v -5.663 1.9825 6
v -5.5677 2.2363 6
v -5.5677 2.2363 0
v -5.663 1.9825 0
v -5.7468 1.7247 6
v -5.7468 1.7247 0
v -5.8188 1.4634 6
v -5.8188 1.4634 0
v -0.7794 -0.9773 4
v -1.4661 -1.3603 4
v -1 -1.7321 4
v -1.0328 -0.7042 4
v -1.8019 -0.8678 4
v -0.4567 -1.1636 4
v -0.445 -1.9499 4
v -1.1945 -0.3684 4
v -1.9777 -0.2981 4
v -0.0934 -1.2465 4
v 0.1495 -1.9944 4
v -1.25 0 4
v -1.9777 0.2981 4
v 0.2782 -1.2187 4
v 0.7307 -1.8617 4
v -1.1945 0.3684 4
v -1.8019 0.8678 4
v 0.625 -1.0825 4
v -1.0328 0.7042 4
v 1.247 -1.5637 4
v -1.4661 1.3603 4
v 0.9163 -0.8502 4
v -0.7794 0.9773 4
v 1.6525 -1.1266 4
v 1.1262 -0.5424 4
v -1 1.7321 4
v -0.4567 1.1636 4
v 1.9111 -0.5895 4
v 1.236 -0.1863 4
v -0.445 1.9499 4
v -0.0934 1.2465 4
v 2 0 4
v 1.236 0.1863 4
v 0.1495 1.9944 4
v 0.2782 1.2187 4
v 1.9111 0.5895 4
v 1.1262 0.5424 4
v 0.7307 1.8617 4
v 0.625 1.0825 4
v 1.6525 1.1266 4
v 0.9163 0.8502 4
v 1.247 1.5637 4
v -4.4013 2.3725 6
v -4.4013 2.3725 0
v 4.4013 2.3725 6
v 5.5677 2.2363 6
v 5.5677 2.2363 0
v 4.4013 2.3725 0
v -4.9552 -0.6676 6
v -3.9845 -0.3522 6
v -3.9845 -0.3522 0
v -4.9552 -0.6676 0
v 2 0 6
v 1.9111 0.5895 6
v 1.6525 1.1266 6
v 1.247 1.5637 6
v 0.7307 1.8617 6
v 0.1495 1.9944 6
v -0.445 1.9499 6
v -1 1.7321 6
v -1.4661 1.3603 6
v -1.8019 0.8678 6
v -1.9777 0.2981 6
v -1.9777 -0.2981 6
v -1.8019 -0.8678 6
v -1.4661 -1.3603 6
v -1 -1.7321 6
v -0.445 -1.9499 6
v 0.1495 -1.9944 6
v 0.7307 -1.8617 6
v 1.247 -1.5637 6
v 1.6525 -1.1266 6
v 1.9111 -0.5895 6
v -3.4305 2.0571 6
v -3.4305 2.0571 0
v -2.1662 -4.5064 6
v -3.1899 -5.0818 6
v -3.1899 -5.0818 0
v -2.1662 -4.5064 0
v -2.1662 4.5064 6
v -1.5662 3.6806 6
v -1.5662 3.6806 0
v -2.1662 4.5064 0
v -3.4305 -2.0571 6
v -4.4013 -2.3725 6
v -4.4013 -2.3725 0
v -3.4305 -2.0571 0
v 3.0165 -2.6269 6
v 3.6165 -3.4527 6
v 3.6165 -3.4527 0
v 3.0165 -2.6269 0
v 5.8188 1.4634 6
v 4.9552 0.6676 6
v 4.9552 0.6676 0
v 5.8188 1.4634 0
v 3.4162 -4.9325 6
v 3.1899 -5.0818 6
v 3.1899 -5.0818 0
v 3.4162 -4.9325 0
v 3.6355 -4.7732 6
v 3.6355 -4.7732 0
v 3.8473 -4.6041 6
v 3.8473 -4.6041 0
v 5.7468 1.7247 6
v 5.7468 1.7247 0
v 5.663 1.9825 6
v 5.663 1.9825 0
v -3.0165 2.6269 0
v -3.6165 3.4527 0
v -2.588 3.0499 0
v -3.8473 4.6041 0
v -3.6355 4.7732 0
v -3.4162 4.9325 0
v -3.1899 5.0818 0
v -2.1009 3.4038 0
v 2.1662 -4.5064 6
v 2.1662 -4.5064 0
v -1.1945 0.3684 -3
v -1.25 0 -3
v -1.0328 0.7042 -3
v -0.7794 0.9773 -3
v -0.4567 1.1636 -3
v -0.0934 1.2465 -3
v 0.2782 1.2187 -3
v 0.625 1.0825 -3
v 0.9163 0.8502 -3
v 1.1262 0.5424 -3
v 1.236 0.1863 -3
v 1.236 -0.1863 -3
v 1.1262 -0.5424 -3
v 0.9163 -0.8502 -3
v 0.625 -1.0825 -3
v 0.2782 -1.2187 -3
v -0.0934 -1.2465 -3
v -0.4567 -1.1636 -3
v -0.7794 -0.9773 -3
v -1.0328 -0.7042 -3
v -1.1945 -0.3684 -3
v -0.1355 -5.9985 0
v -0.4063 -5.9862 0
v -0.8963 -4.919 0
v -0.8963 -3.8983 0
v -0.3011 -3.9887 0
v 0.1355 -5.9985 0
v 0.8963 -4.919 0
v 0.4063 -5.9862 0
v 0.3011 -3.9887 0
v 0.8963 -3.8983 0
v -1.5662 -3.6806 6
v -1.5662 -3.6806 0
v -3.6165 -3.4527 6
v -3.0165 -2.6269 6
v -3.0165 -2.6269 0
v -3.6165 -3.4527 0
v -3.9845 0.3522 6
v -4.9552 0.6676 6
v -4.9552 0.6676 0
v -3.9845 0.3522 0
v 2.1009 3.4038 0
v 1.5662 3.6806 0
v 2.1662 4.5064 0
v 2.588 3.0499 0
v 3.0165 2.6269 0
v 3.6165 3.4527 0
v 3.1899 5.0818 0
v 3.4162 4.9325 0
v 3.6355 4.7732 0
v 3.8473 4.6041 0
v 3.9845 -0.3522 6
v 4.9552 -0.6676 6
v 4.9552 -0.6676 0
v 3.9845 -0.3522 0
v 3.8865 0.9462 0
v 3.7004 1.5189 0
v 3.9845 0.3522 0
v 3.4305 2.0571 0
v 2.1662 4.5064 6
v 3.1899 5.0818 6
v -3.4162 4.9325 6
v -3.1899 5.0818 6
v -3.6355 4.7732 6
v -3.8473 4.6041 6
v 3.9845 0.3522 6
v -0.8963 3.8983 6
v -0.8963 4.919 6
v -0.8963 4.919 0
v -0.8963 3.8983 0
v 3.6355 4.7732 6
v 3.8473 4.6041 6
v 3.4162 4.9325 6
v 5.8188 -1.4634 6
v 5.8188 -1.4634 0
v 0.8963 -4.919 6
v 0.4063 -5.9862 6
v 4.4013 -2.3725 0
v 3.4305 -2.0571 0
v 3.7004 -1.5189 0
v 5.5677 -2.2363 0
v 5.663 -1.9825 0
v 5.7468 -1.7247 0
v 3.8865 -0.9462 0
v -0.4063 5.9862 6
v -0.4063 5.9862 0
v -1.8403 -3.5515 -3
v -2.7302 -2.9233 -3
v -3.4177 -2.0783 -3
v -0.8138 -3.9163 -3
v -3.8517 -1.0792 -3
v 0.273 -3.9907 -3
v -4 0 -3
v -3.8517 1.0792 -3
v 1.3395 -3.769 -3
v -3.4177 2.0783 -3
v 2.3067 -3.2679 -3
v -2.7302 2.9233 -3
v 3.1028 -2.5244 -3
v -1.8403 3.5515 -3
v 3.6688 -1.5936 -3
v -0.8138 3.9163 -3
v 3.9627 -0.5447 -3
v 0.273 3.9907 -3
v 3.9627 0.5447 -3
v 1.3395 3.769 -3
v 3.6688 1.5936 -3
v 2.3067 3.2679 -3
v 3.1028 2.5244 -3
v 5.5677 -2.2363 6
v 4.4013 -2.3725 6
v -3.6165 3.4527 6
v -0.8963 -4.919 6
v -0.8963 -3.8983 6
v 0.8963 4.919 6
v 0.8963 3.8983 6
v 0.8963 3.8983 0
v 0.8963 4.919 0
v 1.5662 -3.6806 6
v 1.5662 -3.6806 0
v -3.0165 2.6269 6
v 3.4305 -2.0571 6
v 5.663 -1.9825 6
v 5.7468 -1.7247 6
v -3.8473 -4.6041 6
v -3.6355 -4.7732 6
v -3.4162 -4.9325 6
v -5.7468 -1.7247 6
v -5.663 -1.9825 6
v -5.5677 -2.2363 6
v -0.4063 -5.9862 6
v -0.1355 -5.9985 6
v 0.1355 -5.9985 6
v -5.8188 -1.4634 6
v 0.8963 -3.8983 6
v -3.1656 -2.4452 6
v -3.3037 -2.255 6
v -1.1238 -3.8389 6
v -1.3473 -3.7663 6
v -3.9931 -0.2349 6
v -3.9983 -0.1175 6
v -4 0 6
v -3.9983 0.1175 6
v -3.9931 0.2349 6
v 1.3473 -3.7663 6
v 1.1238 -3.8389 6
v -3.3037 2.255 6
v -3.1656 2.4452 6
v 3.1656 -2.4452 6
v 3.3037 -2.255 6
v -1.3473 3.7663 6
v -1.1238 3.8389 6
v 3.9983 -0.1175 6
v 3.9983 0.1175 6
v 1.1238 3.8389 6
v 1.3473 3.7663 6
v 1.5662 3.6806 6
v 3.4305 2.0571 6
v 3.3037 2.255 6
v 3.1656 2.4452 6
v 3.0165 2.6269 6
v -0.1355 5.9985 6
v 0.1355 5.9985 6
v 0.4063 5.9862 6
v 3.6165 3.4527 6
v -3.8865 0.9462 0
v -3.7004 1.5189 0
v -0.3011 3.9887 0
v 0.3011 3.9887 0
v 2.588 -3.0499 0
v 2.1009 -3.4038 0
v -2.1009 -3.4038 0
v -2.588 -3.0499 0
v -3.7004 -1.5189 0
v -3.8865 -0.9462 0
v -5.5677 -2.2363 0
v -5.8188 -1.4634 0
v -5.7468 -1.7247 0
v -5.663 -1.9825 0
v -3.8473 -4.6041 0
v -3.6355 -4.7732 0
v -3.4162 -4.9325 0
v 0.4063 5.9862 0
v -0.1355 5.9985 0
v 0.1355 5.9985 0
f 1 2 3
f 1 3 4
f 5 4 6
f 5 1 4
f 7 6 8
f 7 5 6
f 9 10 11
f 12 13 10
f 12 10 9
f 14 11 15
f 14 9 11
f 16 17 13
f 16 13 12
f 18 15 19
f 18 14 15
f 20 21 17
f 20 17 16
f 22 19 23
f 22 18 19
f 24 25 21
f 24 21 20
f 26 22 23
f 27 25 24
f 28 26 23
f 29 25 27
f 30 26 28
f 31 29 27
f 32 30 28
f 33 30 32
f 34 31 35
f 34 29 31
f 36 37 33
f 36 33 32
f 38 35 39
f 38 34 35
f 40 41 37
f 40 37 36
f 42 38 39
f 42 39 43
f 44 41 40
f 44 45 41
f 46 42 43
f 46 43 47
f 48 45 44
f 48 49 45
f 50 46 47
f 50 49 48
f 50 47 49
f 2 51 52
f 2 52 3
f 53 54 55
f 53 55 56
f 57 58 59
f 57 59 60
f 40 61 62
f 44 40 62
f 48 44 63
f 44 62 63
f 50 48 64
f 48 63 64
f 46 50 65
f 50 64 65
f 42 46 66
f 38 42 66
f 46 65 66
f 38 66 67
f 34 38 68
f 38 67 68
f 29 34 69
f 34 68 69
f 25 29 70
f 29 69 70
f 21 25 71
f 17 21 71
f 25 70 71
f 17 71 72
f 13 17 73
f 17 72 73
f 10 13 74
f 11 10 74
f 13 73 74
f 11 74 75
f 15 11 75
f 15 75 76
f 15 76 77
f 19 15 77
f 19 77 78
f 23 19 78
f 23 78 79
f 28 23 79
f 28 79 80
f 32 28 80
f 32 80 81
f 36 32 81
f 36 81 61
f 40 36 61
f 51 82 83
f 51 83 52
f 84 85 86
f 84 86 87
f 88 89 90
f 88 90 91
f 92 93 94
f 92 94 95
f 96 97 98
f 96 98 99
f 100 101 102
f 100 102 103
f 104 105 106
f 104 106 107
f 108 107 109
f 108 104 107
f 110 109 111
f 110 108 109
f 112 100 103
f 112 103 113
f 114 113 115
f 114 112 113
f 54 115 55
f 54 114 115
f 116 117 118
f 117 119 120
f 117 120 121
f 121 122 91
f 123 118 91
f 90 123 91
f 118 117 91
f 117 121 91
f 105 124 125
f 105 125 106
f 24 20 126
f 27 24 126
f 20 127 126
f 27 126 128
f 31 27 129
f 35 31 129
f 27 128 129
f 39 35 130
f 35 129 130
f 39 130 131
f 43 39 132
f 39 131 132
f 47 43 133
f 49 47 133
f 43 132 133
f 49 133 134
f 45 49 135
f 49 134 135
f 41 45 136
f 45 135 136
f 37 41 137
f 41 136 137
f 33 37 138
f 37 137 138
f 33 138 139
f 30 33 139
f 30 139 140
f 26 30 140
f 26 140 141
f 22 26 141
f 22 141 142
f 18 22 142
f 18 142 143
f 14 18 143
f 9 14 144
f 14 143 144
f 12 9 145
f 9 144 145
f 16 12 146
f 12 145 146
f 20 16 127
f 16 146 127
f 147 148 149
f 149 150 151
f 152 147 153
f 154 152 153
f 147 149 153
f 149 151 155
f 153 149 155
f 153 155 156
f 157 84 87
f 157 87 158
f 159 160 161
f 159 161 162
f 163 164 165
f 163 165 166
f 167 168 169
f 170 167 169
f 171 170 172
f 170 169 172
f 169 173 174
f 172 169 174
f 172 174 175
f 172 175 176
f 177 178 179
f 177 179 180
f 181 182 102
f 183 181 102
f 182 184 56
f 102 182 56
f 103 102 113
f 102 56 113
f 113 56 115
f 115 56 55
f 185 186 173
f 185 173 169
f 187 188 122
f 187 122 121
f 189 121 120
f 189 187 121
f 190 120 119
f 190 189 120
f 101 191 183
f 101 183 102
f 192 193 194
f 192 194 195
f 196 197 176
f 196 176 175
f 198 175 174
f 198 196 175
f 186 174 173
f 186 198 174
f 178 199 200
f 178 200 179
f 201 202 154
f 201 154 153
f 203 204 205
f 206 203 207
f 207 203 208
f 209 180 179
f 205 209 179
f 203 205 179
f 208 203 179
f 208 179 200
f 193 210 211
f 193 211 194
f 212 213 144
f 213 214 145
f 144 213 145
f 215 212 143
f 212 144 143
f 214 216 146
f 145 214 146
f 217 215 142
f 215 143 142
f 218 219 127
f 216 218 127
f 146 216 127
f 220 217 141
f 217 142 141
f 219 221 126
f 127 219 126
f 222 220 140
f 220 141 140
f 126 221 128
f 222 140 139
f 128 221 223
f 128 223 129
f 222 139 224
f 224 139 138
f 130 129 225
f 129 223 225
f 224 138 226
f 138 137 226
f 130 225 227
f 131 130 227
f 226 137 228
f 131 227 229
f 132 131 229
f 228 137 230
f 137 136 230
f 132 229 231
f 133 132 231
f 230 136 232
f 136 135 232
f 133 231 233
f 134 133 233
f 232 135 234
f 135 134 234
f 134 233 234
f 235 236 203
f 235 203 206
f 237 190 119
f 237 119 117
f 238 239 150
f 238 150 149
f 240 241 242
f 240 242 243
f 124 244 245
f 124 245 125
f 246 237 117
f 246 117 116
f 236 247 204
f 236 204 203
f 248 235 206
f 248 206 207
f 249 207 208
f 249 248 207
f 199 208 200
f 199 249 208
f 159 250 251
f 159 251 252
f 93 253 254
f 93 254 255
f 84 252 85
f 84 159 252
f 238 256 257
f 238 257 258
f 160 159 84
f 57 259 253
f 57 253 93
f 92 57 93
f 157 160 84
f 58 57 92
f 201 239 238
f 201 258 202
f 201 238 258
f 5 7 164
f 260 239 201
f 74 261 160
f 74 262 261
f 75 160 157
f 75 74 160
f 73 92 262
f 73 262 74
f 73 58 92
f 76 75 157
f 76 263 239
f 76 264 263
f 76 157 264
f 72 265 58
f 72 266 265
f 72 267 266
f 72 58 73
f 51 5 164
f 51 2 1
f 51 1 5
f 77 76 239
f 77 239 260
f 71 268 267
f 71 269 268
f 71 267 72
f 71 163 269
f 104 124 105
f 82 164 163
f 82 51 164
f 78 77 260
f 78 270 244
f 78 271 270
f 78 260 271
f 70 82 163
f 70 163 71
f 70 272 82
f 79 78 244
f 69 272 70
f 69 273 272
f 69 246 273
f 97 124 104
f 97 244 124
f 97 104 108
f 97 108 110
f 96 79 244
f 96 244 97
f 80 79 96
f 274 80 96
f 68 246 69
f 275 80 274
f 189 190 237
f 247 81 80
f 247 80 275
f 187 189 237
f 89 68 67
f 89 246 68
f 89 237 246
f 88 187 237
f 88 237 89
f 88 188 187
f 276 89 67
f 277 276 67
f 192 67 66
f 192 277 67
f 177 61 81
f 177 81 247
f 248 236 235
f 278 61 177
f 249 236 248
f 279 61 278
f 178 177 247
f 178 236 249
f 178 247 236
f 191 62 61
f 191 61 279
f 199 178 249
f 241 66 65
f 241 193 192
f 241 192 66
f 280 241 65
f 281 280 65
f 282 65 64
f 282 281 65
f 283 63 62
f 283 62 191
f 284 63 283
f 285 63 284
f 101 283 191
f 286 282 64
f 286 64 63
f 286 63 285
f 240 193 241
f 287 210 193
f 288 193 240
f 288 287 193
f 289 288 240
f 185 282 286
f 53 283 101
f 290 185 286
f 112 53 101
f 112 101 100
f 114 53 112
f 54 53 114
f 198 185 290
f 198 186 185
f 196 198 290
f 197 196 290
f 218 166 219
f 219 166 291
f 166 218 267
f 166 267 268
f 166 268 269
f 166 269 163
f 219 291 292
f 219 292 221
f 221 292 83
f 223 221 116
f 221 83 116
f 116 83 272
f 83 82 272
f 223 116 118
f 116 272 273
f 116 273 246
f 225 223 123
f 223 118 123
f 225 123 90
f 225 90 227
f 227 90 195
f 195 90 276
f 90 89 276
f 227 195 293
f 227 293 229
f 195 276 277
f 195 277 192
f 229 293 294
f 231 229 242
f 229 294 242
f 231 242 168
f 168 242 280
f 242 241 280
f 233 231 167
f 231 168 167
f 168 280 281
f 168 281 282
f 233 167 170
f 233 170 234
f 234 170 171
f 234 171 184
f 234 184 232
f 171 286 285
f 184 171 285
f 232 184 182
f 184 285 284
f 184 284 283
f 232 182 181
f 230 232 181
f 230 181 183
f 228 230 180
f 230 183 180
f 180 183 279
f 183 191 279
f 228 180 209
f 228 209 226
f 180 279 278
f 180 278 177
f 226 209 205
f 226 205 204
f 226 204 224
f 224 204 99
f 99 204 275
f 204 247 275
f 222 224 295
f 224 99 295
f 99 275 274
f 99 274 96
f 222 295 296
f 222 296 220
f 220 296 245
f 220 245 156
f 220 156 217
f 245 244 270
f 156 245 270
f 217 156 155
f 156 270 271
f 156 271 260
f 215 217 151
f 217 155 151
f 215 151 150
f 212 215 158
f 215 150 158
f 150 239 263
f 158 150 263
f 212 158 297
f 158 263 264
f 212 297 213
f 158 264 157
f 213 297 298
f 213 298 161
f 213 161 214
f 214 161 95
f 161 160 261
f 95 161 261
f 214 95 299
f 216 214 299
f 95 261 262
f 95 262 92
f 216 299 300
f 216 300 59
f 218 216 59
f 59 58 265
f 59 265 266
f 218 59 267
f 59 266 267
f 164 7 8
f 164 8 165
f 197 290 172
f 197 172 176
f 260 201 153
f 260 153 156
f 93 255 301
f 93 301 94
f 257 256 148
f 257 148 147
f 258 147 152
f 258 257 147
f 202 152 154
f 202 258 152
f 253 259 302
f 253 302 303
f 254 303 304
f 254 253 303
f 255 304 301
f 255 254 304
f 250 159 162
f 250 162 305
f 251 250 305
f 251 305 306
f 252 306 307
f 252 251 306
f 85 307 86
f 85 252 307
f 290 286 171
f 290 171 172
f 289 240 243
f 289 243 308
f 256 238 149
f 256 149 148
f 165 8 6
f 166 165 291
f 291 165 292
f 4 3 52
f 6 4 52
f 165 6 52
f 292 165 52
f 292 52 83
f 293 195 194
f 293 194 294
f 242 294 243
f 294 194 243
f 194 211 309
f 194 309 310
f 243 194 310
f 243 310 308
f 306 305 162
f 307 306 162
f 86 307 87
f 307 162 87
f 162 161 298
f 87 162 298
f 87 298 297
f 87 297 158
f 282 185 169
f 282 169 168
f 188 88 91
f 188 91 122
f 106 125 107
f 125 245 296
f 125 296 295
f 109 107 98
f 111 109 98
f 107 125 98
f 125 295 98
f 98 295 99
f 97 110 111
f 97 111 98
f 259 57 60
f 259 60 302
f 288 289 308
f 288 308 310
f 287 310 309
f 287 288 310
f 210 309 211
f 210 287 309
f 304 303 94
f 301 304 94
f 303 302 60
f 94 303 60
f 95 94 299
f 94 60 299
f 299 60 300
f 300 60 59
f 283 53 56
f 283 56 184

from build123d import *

# Parameters (mm, degrees)
SKETCH_1_W                   = 4
SKETCH_1_H                   = 9
EXTRUDE_1_DEPTH              = 6
EXTRUDE_2_DEPTH              = 6
EXTRUDE_3_DEPTH              = 6
EXTRUDE_4_DEPTH              = 6
EXTRUDE_5_DEPTH              = 6
EXTRUDE_6_DEPTH              = 6
EXTRUDE_7_DEPTH              = 6
EXTRUDE_8_DEPTH              = 6
EXTRUDE_9_DEPTH              = 6
EXTRUDE_10_DEPTH             = 6
HOLE_WIZARD_M2_1_D           = 2.5
HOLE_WIZARD_M2_1_CBORE_D     = 4
HOLE_WIZARD_M2_1_CBORE_DEPTH = 2


with BuildPart() as part:
    # 草图1 → 旋转1 (revolve)
    with BuildSketch(Plane.XZ, mode=Mode.PRIVATE) as revolve_1_sk:
        with Locations((2, 1.5)):
            Rectangle(SKETCH_1_W, SKETCH_1_H)
    revolve(revolve_1_sk.sketch.rotate(Axis((0, 0, 6), (0, 0, -1)), 180), axis=Axis((0, 0, 6), (0, 0, -1)))

    # 草图2 → 凸台-拉伸1 (add)
    with BuildSketch(Plane.XY.offset(6)):
        with BuildLine():
            Line((3.984468068, 0.352156525), (4.955233641, 0.66757738))
            Line((4.955233641, 0.66757738), (5.818800307, 1.463408004))
            ThreePointArc((5.818800307, 1.463408004), (5.706339098, 1.854101966), (5.567677978, 2.236283062))
            Line((5.567677978, 2.236283062), (4.401260366, 2.372531811))
            Line((4.401260366, 2.372531811), (3.430494792, 2.057110955))
            ThreePointArc((3.430494792, 2.057110955), (3.804226065, 1.236067977), (3.984468068, 0.352156525))
        make_face()
    extrude(amount=-EXTRUDE_1_DEPTH)

    # 草图3 → 凸台-拉伸2 (add)
    with BuildSketch(Plane.XY.offset(6)):
        with BuildLine():
            Line((3.016509969, 2.626912182), (3.616476088, 3.452694702))
            Line((3.616476088, 3.452694702), (3.847338693, 4.604126951))
            ThreePointArc((3.847338693, 4.604126951), (3.526711514, 4.854101966), (3.1898919, 5.081790006))
            Line((3.1898919, 5.081790006), (2.166155224, 4.506414489))
            Line((2.166155224, 4.506414489), (1.566189104, 3.680631969))
            ThreePointArc((1.566189104, 3.680631969), (2.351141009, 3.236067977), (3.016509969, 2.626912182))
        make_face()
    extrude(amount=-EXTRUDE_2_DEPTH)

    # 草图4 → 凸台-拉伸3 (add)
    with BuildSketch(Plane.XY.offset(6)):
        with BuildLine():
            Line((0.896347589, 3.898276671), (0.896347589, 4.919))
            Line((0.896347589, 4.919), (0.406324464, 5.986225892))
            ThreePointArc((0.406324464, 5.986225892), (0, 6), (-0.406324464, 5.986225892))
            Line((-0.406324464, 5.986225892), (-0.896347589, 4.919))
            Line((-0.896347589, 4.919), (-0.896347589, 3.898276671))
            ThreePointArc((-0.896347589, 3.898276671), (0, 4), (0.896347589, 3.898276671))
        make_face()
    extrude(amount=-EXTRUDE_3_DEPTH)

    # 草图5 → 凸台-拉伸4 (add)
    with BuildSketch(Plane.XY.offset(6)):
        with BuildLine():
            Line((-1.566189104, 3.680631969), (-2.166155224, 4.506414489))
            Line((-2.166155224, 4.506414489), (-3.1898919, 5.081790006))
            ThreePointArc((-3.1898919, 5.081790006), (-3.526711514, 4.854101966), (-3.847338693, 4.604126951))
            Line((-3.847338693, 4.604126951), (-3.616476088, 3.452694702))
            Line((-3.616476088, 3.452694702), (-3.016509969, 2.626912182))
            ThreePointArc((-3.016509969, 2.626912182), (-2.351141009, 3.236067977), (-1.566189104, 3.680631969))
        make_face()
    extrude(amount=-EXTRUDE_4_DEPTH)

    # 草图6 → 凸台-拉伸5 (add)
    with BuildSketch(Plane.XY.offset(6)):
        with BuildLine():
            Line((-3.430494792, 2.057110955), (-4.401260366, 2.372531811))
            Line((-4.401260366, 2.372531811), (-5.567677978, 2.236283062))
            ThreePointArc((-5.567677978, 2.236283062), (-5.706339098, 1.854101966), (-5.818800307, 1.463408004))
            Line((-5.818800307, 1.463408004), (-4.955233641, 0.66757738))
            Line((-4.955233641, 0.66757738), (-3.984468068, 0.352156525))
            ThreePointArc((-3.984468068, 0.352156525), (-3.804226065, 1.236067977), (-3.430494792, 2.057110955))
        make_face()
    extrude(amount=-EXTRUDE_5_DEPTH)

    # 草图7 → 凸台-拉伸6 (add)
    with BuildSketch(Plane.XY.offset(6)):
        with BuildLine():
            Line((-3.984468068, -0.352156525), (-4.955233641, -0.66757738))
            Line((-4.955233641, -0.66757738), (-5.818800307, -1.463408004))
            ThreePointArc((-5.818800307, -1.463408004), (-5.706339098, -1.854101966), (-5.567677978, -2.236283062))
            Line((-5.567677978, -2.236283062), (-4.401260366, -2.372531811))
            Line((-4.401260366, -2.372531811), (-3.430494792, -2.057110955))
            ThreePointArc((-3.430494792, -2.057110955), (-3.804226065, -1.236067977), (-3.984468068, -0.352156525))
        make_face()
    extrude(amount=-EXTRUDE_6_DEPTH)

    # 草图8 → 凸台-拉伸7 (add)
    with BuildSketch(Plane.XY.offset(6)):
        with BuildLine():
            Line((-3.016509969, -2.626912182), (-3.616476088, -3.452694702))
            Line((-3.616476088, -3.452694702), (-3.847338693, -4.604126951))
            ThreePointArc((-3.847338693, -4.604126951), (-3.526711514, -4.854101966), (-3.1898919, -5.081790006))
            Line((-3.1898919, -5.081790006), (-2.166155224, -4.506414489))
            Line((-2.166155224, -4.506414489), (-1.566189104, -3.680631969))
            ThreePointArc((-1.566189104, -3.680631969), (-2.351141009, -3.236067977), (-3.016509969, -2.626912182))
        make_face()
    extrude(amount=-EXTRUDE_7_DEPTH)

    # 草图9 → 凸台-拉伸8 (add)
    with BuildSketch(Plane.XY.offset(6)):
        with BuildLine():
            Line((-0.896347589, -3.898276671), (-0.896347589, -4.919))
            Line((-0.896347589, -4.919), (-0.406324464, -5.986225892))
            ThreePointArc((-0.406324464, -5.986225892), (0, -6), (0.406324464, -5.986225892))
            Line((0.406324464, -5.986225892), (0.896347589, -4.919))
            Line((0.896347589, -4.919), (0.896347589, -3.898276671))
            ThreePointArc((0.896347589, -3.898276671), (0, -4), (-0.896347589, -3.898276671))
        make_face()
    extrude(amount=-EXTRUDE_8_DEPTH)

    # 草图10 → 凸台-拉伸9 (add)
    with BuildSketch(Plane.XY.offset(6)):
        with BuildLine():
            Line((1.566189104, -3.680631969), (2.166155224, -4.506414489))
            Line((2.166155224, -4.506414489), (3.1898919, -5.081790006))
            ThreePointArc((3.1898919, -5.081790006), (3.526711514, -4.854101966), (3.847338693, -4.604126951))
            Line((3.847338693, -4.604126951), (3.616476088, -3.452694702))
            Line((3.616476088, -3.452694702), (3.016509969, -2.626912182))
            ThreePointArc((3.016509969, -2.626912182), (2.351141009, -3.236067977), (1.566189104, -3.680631969))
        make_face()
    extrude(amount=-EXTRUDE_9_DEPTH)

    # 草图11 → 凸台-拉伸10 (add)
    with BuildSketch(Plane.XY.offset(6)):
        with BuildLine():
            Line((3.430494792, -2.057110955), (4.401260366, -2.372531811))
            Line((4.401260366, -2.372531811), (5.567677978, -2.236283062))
            ThreePointArc((5.567677978, -2.236283062), (5.706339098, -1.854101966), (5.818800307, -1.463408004))
            Line((5.818800307, -1.463408004), (4.955233641, -0.66757738))
            Line((4.955233641, -0.66757738), (3.984468068, -0.352156525))
            ThreePointArc((3.984468068, -0.352156525), (3.804226065, -1.236067977), (3.430494792, -2.057110955))
        make_face()
    extrude(amount=-EXTRUDE_10_DEPTH)

    # M2 六角头机械螺钉的柱形沉头孔1 (through all)
    with Locations(Plane.XY.offset(6)):
        with Locations((0, 0)):
            CounterBoreHole(HOLE_WIZARD_M2_1_D / 2, HOLE_WIZARD_M2_1_CBORE_D / 2, HOLE_WIZARD_M2_1_CBORE_DEPTH)


solid = part.part
